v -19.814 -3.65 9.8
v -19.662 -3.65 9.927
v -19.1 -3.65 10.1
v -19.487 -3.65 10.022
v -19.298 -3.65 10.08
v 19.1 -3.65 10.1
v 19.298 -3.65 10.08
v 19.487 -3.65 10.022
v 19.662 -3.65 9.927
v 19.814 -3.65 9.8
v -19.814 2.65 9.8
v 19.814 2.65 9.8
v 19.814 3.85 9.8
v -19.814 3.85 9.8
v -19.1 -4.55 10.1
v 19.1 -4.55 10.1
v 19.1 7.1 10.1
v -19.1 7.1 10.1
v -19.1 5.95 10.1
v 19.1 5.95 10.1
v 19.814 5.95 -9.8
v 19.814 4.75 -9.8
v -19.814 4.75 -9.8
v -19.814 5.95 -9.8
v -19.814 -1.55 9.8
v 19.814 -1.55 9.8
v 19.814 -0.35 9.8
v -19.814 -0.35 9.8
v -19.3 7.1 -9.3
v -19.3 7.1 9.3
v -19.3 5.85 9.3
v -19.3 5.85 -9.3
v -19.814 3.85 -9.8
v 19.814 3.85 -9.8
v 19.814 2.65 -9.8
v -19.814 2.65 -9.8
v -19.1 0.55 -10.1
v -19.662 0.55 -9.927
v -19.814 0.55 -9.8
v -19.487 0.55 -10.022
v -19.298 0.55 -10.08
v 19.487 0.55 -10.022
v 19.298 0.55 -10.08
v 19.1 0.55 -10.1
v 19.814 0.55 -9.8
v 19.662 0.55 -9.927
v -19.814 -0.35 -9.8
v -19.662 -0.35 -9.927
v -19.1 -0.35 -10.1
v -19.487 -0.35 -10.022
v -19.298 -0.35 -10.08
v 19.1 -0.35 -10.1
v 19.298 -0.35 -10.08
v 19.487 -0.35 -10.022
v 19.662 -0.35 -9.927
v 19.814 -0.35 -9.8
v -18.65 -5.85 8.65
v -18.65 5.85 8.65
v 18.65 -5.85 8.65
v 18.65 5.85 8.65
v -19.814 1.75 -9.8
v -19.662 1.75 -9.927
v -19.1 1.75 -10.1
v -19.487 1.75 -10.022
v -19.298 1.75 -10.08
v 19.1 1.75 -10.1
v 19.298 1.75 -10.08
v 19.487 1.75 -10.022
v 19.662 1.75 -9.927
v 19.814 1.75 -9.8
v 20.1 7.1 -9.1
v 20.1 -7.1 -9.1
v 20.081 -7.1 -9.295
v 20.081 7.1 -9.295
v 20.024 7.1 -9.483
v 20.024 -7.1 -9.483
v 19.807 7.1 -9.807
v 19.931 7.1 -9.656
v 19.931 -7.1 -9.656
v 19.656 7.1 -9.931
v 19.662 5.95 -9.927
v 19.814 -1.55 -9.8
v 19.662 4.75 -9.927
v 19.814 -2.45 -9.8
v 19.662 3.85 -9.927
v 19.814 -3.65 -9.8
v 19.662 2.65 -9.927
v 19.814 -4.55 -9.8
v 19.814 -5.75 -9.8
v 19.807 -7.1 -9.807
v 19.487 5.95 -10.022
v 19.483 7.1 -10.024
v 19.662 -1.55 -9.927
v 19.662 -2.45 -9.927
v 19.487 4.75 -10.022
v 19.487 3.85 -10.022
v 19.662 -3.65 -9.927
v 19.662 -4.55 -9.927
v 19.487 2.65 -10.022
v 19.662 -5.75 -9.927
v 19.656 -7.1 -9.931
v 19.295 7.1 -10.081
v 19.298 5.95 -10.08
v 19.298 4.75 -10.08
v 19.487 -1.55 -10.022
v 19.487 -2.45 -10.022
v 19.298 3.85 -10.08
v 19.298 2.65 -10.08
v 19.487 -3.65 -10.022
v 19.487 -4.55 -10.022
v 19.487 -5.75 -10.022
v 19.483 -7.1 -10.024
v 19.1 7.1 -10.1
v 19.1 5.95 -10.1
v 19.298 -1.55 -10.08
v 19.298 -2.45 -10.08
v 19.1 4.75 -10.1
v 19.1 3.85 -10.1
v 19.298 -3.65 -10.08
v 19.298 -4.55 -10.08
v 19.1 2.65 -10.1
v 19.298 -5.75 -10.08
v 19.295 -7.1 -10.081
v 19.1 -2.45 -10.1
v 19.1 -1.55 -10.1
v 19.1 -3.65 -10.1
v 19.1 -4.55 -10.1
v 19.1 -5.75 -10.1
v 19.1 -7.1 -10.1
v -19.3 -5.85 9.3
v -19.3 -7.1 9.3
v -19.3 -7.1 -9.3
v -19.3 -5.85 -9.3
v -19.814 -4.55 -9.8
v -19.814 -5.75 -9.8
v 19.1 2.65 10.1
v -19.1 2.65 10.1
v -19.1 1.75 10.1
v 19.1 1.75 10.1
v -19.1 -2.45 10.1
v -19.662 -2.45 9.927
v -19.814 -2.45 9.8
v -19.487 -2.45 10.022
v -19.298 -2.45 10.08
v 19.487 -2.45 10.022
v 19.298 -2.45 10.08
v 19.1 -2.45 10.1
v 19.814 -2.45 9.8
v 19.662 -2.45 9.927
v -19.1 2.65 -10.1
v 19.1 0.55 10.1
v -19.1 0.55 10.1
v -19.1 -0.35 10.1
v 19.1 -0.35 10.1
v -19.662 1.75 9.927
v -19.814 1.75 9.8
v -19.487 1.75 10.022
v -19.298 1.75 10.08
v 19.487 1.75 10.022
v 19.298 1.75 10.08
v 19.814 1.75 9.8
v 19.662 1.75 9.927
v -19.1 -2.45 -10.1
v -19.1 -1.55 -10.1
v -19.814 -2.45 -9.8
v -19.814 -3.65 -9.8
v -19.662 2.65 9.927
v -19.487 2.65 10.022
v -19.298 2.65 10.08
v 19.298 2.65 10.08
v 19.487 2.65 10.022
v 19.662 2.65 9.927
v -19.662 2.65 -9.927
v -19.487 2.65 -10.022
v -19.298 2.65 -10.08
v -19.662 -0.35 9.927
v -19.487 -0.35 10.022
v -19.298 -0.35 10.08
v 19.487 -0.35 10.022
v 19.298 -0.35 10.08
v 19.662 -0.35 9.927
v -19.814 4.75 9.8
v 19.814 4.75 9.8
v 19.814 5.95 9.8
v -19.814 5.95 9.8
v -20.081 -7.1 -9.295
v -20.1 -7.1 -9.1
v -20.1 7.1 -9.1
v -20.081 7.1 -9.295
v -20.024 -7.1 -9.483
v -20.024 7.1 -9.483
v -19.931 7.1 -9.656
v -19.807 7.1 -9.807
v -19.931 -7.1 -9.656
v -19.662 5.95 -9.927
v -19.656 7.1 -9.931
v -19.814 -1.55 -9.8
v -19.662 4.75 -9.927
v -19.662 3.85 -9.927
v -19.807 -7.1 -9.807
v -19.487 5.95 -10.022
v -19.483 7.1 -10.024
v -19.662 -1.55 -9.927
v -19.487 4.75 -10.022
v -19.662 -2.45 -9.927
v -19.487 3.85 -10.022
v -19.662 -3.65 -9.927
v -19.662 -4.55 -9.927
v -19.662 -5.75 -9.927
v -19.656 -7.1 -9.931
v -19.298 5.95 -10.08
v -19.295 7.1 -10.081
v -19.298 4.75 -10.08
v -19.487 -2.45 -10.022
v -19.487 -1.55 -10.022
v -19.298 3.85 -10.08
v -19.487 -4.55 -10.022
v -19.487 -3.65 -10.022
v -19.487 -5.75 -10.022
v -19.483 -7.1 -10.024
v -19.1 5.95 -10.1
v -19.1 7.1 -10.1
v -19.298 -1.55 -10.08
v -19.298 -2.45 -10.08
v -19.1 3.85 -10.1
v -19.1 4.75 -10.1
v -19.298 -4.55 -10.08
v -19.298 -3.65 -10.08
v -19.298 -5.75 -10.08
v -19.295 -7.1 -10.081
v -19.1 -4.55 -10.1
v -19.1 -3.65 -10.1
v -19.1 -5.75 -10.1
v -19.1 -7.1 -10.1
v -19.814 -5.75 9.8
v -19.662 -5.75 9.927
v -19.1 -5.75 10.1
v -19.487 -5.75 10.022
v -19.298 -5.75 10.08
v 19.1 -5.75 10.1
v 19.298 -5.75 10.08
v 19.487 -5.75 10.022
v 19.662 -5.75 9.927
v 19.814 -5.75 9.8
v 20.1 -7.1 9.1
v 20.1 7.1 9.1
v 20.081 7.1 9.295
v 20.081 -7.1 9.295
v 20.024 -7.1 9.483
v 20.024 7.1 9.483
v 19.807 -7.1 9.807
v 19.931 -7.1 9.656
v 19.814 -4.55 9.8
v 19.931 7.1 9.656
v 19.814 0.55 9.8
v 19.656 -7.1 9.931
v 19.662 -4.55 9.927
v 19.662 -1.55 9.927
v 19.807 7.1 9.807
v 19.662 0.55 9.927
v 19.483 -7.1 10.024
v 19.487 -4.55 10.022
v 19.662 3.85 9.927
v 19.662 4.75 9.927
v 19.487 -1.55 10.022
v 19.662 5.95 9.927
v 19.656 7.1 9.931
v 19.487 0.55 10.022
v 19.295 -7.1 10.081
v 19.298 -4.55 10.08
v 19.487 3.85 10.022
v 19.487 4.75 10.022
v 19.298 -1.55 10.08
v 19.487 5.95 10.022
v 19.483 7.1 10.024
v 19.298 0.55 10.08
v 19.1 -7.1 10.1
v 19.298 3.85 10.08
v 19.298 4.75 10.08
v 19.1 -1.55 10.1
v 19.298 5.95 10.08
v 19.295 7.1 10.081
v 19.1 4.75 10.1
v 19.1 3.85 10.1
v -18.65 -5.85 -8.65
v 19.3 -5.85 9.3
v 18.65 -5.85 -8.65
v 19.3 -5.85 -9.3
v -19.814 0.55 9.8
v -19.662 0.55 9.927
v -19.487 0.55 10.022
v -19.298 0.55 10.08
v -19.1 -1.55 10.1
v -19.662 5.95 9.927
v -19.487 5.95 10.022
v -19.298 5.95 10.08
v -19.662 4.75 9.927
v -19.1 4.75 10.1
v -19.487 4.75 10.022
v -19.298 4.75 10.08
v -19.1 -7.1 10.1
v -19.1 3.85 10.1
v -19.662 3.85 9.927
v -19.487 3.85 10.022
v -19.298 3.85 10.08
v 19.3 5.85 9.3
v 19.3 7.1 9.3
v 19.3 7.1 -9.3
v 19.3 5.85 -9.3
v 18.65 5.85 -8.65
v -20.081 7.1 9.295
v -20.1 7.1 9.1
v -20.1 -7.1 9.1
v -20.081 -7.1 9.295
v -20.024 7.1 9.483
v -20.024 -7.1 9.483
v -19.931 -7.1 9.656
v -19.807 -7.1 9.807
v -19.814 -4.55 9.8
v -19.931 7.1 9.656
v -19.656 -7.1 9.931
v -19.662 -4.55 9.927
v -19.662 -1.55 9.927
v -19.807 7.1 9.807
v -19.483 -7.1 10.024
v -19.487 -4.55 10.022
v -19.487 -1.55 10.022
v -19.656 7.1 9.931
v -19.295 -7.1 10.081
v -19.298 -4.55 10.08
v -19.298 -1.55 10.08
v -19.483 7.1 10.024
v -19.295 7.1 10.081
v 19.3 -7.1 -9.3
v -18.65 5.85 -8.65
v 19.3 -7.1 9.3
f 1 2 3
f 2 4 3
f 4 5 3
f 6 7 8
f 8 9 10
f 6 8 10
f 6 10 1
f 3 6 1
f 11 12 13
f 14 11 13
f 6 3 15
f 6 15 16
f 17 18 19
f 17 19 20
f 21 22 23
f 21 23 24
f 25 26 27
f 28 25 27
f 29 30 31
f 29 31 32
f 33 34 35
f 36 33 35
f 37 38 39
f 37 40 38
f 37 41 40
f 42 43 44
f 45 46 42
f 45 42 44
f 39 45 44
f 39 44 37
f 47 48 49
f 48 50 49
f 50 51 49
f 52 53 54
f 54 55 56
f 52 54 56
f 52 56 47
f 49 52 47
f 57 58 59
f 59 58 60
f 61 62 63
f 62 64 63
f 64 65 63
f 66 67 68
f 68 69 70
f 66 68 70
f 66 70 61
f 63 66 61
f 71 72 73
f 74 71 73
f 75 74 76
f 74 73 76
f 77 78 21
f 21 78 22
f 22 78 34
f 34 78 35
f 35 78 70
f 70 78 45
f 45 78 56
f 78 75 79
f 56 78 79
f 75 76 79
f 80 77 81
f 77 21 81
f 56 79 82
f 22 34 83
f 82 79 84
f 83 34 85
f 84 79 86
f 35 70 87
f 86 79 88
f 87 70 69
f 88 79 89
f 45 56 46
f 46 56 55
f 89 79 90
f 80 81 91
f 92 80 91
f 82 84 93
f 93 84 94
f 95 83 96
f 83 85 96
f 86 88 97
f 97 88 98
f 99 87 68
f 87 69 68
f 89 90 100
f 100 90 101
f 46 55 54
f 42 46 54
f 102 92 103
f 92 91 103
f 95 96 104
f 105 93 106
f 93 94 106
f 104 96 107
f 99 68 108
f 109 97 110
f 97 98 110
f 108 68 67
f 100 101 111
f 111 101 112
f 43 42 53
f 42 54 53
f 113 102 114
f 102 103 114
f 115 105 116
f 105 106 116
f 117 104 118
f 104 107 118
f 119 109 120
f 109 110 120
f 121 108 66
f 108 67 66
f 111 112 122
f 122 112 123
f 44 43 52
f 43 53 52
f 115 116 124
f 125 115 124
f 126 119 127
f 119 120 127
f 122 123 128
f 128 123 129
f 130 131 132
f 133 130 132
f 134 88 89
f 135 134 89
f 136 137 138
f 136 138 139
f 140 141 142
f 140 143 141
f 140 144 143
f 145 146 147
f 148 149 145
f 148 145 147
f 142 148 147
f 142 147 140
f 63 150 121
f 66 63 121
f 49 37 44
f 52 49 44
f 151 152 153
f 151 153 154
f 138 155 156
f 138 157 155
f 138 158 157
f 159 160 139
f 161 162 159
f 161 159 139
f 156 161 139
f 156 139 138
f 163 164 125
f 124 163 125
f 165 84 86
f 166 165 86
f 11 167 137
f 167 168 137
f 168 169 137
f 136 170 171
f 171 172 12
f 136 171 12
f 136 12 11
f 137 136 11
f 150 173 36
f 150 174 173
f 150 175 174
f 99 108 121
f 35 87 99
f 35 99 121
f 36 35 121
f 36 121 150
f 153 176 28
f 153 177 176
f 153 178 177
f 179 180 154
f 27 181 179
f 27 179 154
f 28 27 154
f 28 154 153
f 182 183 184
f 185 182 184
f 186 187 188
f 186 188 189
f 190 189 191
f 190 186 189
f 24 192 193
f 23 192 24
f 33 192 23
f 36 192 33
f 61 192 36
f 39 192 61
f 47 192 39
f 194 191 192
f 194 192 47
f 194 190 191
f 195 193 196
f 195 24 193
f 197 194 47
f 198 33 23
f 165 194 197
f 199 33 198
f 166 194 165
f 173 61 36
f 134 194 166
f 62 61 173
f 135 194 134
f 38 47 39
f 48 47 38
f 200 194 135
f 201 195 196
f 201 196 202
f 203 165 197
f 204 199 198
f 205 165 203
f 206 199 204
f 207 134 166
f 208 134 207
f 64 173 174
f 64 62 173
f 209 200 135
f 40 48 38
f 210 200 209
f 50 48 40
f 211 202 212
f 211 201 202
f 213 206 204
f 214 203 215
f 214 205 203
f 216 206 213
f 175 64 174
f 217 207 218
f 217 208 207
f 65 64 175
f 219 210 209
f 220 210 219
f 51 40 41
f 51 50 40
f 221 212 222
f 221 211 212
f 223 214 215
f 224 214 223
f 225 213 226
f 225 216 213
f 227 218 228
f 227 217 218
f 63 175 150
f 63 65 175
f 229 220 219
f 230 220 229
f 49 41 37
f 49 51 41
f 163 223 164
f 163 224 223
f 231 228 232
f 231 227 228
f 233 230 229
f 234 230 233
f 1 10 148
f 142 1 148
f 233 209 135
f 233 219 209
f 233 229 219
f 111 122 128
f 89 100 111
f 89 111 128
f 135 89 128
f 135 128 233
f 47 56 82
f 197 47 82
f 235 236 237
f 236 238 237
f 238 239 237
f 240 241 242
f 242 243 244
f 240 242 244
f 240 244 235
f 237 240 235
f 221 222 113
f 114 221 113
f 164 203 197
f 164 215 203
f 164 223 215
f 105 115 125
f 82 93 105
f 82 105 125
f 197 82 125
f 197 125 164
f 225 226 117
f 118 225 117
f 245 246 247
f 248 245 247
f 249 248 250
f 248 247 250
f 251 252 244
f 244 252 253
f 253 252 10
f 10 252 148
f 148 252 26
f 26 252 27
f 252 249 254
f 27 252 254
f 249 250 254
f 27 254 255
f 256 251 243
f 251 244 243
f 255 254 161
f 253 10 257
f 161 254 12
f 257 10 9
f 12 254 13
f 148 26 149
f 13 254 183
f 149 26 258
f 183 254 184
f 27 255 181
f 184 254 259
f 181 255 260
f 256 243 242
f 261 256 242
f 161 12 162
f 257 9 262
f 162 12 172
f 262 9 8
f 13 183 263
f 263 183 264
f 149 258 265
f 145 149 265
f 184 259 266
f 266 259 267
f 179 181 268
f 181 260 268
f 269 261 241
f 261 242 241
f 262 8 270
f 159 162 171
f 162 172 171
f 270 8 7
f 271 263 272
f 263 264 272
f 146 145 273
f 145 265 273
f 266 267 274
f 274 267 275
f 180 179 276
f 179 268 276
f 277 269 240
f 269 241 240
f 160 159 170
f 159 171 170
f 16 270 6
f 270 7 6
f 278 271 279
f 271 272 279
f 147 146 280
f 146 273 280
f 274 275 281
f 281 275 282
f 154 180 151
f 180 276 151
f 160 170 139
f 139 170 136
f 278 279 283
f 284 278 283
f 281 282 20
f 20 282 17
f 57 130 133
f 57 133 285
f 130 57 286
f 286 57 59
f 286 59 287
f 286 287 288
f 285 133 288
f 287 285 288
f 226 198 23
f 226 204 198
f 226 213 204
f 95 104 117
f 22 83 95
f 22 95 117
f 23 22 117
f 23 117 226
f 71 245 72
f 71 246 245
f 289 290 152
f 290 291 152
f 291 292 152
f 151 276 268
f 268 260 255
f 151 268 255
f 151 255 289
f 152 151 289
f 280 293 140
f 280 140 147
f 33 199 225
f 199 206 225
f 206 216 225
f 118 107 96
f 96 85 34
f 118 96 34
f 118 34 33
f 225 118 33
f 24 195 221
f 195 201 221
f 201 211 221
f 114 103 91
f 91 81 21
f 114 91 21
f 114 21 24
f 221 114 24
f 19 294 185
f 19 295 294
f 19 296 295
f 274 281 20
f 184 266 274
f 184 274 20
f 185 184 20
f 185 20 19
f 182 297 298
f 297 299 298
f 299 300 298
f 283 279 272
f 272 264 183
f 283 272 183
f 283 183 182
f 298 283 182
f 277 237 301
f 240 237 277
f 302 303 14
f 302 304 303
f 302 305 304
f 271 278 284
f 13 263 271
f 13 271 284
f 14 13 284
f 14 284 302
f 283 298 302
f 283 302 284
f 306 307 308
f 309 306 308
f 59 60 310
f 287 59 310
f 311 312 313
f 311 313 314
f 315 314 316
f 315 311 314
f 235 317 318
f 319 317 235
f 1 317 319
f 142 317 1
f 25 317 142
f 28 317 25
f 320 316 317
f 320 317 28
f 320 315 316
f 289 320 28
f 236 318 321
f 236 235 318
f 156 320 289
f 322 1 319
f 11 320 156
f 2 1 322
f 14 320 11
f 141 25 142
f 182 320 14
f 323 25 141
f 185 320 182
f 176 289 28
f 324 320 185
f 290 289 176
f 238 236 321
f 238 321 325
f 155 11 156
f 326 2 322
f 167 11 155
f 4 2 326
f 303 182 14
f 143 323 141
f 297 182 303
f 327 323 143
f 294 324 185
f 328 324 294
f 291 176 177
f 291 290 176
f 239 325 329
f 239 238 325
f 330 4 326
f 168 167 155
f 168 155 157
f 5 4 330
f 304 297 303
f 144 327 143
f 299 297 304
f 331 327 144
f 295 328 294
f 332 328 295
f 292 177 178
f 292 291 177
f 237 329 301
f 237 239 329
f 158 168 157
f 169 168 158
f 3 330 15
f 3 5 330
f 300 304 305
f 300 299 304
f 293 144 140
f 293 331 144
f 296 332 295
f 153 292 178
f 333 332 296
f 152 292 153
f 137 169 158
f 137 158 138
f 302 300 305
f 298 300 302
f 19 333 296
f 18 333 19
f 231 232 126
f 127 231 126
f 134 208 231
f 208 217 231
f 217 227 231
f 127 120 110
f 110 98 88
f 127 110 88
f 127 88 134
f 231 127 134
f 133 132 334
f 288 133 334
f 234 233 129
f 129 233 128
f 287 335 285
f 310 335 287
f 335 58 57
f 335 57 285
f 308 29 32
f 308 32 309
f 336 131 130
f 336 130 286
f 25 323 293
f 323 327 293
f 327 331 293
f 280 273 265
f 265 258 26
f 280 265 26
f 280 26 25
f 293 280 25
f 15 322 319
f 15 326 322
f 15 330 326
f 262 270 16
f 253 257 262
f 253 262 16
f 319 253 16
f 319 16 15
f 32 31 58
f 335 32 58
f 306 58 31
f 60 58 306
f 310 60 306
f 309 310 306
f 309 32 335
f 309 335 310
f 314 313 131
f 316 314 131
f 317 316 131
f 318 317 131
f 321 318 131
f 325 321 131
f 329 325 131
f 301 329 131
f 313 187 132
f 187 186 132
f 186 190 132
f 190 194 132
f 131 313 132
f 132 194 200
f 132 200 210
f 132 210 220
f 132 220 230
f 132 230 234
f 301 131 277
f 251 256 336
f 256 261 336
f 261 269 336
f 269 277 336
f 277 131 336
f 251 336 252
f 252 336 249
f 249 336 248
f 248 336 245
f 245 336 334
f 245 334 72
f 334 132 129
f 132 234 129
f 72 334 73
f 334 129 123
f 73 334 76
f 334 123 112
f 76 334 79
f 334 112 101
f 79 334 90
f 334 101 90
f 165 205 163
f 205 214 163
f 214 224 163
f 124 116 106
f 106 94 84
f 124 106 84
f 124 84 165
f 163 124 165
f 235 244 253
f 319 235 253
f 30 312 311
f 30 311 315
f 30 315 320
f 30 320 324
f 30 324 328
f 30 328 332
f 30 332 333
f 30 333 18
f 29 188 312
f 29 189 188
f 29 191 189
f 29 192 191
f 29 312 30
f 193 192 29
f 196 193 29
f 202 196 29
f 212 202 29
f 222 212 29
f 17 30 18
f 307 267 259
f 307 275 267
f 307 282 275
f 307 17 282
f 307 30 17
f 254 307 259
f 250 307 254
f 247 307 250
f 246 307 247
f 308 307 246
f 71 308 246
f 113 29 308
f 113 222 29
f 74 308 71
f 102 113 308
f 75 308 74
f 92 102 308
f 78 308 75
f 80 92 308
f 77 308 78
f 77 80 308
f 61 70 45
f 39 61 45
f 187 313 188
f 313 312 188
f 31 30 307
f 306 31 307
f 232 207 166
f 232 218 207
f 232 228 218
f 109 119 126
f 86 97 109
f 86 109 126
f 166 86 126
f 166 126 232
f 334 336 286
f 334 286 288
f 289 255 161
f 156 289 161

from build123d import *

# Parameters (mm, degrees)
SKETCH1_W                = 40.2
SKETCH1_H                = 20.2
BOSS_EXTRUDE1_DEPTH      = 7.1
BOSS_EXTRUDE1_DEPTH_BACK = 7.1
FILLET1_R                = 1
SKETCH2_W                = 38.6
SKETCH2_H                = 18.6
CUT_EXTRUDE1_DEPTH       = 1.25
SKETCH3_W                = 37.3
SKETCH3_H                = 17.3
CUT_EXTRUDE2_DEPTH       = 13.95
SKETCH4_W                = 0.3
SKETCH4_H                = 1.2
CUT_EXTRUDE3_DEPTH       = 41.2
LPATTERN1_COUNT          = 6
LPATTERN1_PITCH          = 2.1
MIRROR2_COPY_1_SKETCH_W  = 0.3
MIRROR2_COPY_1_SKETCH_H  = 1.2
MIRROR2_COPY_1_DEPTH     = 41.2
MIRROR2_COPY_2_SKETCH_W  = 0.3
MIRROR2_COPY_2_SKETCH_H  = 1.2
MIRROR2_COPY_2_DEPTH     = 41.2
MIRROR2_COPY_3_SKETCH_W  = 0.3
MIRROR2_COPY_3_SKETCH_H  = 1.2
MIRROR2_COPY_3_DEPTH     = 41.2
MIRROR2_COPY_4_SKETCH_W  = 0.3
MIRROR2_COPY_4_SKETCH_H  = 1.2
MIRROR2_COPY_4_DEPTH     = 41.2
MIRROR2_COPY_5_SKETCH_W  = 0.3
MIRROR2_COPY_5_SKETCH_H  = 1.2
MIRROR2_COPY_5_DEPTH     = 41.2


with BuildPart() as part:
    # Sketch1 → Boss-Extrude1 (new body, two sides)
    with BuildSketch(Plane(origin=(0, 0, 0), x_dir=(1, 0, 0), z_dir=(0, 1, 0))) as boss_extrude1_sk:
        Rectangle(SKETCH1_W, SKETCH1_H)
    extrude(amount=BOSS_EXTRUDE1_DEPTH)
    extrude(boss_extrude1_sk.sketch, amount=-BOSS_EXTRUDE1_DEPTH_BACK)

    # Fillet1
    fillet1_edges = [part.edges().sort_by_distance(p)[0] for p in [
        (-20.1, 0, -10.1),
        (20.1, 0, -10.1),
        (20.1, 0, 10.1),
        (-20.1, 0, 10.1),
    ]]
    fillet(fillet1_edges, radius=FILLET1_R)

    # Sketch2 → Cut-Extrude1 (cut)
    with BuildSketch(Plane(origin=(0, 7.1, 0), x_dir=(1, 0, 0), z_dir=(0, 1, 0))):
        Rectangle(SKETCH2_W, SKETCH2_H)
    cut_extrude1 = extrude(amount=-CUT_EXTRUDE1_DEPTH, mode=Mode.SUBTRACT)

    # Sketch3 → Cut-Extrude2 (cut, through all)
    with BuildSketch(Plane(origin=(0, 5.85, 0), x_dir=(1, 0, 0), z_dir=(0, 1, 0))):
        Rectangle(SKETCH3_W, SKETCH3_H)
    extrude(amount=-CUT_EXTRUDE2_DEPTH, mode=Mode.SUBTRACT)

    # Mirror1: Cut-Extrude1 across plane
    add(cut_extrude1.mirror(Plane.ZX), mode=Mode.SUBTRACT)

    # Sketch4 → Cut-Extrude3 (cut, through all)
    with BuildSketch(Plane(origin=(20.1, 0, 0), x_dir=(0, 0, -1), z_dir=(1, 0, 0))):
        with Locations((-9.95, 5.35)):
            Rectangle(SKETCH4_W, SKETCH4_H)
    cut_extrude3 = extrude(amount=-CUT_EXTRUDE3_DEPTH, mode=Mode.SUBTRACT)

    # LPattern1: Cut-Extrude3 ×6
    with Locations(*[(0, -i * LPATTERN1_PITCH, 0) for i in range(1, LPATTERN1_COUNT)]):
        add(cut_extrude3, mode=Mode.SUBTRACT)

    # Mirror2: Cut-Extrude3 across plane
    add(cut_extrude3.mirror(Plane.XY), mode=Mode.SUBTRACT)

    # Mirror2 copy 1 sketch → Mirror2 copy 1 (cut, through all)
    with BuildSketch(Plane(origin=(20.1, -2.1, 0), x_dir=(0, 0, 1), z_dir=(1, 0, 0))):
        with Locations((-9.95, -5.35)):
            Rectangle(MIRROR2_COPY_1_SKETCH_W, MIRROR2_COPY_1_SKETCH_H)
    extrude(amount=-MIRROR2_COPY_1_DEPTH, mode=Mode.SUBTRACT)

    # Mirror2 copy 2 sketch → Mirror2 copy 2 (cut, through all)
    with BuildSketch(Plane(origin=(20.1, -4.2, 0), x_dir=(0, 0, 1), z_dir=(1, 0, 0))):
        with Locations((-9.95, -5.35)):
            Rectangle(MIRROR2_COPY_2_SKETCH_W, MIRROR2_COPY_2_SKETCH_H)
    extrude(amount=-MIRROR2_COPY_2_DEPTH, mode=Mode.SUBTRACT)

    # Mirror2 copy 3 sketch → Mirror2 copy 3 (cut, through all)
    with BuildSketch(Plane(origin=(20.1, -6.3, 0), x_dir=(0, 0, 1), z_dir=(1, 0, 0))):
        with Locations((-9.95, -5.35)):
            Rectangle(MIRROR2_COPY_3_SKETCH_W, MIRROR2_COPY_3_SKETCH_H)
    extrude(amount=-MIRROR2_COPY_3_DEPTH, mode=Mode.SUBTRACT)

    # Mirror2 copy 4 sketch → Mirror2 copy 4 (cut, through all)
    with BuildSketch(Plane(origin=(20.1, -8.4, 0), x_dir=(0, 0, 1), z_dir=(1, 0, 0))):
        with Locations((-9.95, -5.35)):
            Rectangle(MIRROR2_COPY_4_SKETCH_W, MIRROR2_COPY_4_SKETCH_H)
    extrude(amount=-MIRROR2_COPY_4_DEPTH, mode=Mode.SUBTRACT)

    # Mirror2 copy 5 sketch → Mirror2 copy 5 (cut, through all)
    with BuildSketch(Plane(origin=(20.1, -10.5, 0), x_dir=(0, 0, 1), z_dir=(1, 0, 0))):
        with Locations((-9.95, -5.35)):
            Rectangle(MIRROR2_COPY_5_SKETCH_W, MIRROR2_COPY_5_SKETCH_H)
    extrude(amount=-MIRROR2_COPY_5_DEPTH, mode=Mode.SUBTRACT)


solid = part.part
